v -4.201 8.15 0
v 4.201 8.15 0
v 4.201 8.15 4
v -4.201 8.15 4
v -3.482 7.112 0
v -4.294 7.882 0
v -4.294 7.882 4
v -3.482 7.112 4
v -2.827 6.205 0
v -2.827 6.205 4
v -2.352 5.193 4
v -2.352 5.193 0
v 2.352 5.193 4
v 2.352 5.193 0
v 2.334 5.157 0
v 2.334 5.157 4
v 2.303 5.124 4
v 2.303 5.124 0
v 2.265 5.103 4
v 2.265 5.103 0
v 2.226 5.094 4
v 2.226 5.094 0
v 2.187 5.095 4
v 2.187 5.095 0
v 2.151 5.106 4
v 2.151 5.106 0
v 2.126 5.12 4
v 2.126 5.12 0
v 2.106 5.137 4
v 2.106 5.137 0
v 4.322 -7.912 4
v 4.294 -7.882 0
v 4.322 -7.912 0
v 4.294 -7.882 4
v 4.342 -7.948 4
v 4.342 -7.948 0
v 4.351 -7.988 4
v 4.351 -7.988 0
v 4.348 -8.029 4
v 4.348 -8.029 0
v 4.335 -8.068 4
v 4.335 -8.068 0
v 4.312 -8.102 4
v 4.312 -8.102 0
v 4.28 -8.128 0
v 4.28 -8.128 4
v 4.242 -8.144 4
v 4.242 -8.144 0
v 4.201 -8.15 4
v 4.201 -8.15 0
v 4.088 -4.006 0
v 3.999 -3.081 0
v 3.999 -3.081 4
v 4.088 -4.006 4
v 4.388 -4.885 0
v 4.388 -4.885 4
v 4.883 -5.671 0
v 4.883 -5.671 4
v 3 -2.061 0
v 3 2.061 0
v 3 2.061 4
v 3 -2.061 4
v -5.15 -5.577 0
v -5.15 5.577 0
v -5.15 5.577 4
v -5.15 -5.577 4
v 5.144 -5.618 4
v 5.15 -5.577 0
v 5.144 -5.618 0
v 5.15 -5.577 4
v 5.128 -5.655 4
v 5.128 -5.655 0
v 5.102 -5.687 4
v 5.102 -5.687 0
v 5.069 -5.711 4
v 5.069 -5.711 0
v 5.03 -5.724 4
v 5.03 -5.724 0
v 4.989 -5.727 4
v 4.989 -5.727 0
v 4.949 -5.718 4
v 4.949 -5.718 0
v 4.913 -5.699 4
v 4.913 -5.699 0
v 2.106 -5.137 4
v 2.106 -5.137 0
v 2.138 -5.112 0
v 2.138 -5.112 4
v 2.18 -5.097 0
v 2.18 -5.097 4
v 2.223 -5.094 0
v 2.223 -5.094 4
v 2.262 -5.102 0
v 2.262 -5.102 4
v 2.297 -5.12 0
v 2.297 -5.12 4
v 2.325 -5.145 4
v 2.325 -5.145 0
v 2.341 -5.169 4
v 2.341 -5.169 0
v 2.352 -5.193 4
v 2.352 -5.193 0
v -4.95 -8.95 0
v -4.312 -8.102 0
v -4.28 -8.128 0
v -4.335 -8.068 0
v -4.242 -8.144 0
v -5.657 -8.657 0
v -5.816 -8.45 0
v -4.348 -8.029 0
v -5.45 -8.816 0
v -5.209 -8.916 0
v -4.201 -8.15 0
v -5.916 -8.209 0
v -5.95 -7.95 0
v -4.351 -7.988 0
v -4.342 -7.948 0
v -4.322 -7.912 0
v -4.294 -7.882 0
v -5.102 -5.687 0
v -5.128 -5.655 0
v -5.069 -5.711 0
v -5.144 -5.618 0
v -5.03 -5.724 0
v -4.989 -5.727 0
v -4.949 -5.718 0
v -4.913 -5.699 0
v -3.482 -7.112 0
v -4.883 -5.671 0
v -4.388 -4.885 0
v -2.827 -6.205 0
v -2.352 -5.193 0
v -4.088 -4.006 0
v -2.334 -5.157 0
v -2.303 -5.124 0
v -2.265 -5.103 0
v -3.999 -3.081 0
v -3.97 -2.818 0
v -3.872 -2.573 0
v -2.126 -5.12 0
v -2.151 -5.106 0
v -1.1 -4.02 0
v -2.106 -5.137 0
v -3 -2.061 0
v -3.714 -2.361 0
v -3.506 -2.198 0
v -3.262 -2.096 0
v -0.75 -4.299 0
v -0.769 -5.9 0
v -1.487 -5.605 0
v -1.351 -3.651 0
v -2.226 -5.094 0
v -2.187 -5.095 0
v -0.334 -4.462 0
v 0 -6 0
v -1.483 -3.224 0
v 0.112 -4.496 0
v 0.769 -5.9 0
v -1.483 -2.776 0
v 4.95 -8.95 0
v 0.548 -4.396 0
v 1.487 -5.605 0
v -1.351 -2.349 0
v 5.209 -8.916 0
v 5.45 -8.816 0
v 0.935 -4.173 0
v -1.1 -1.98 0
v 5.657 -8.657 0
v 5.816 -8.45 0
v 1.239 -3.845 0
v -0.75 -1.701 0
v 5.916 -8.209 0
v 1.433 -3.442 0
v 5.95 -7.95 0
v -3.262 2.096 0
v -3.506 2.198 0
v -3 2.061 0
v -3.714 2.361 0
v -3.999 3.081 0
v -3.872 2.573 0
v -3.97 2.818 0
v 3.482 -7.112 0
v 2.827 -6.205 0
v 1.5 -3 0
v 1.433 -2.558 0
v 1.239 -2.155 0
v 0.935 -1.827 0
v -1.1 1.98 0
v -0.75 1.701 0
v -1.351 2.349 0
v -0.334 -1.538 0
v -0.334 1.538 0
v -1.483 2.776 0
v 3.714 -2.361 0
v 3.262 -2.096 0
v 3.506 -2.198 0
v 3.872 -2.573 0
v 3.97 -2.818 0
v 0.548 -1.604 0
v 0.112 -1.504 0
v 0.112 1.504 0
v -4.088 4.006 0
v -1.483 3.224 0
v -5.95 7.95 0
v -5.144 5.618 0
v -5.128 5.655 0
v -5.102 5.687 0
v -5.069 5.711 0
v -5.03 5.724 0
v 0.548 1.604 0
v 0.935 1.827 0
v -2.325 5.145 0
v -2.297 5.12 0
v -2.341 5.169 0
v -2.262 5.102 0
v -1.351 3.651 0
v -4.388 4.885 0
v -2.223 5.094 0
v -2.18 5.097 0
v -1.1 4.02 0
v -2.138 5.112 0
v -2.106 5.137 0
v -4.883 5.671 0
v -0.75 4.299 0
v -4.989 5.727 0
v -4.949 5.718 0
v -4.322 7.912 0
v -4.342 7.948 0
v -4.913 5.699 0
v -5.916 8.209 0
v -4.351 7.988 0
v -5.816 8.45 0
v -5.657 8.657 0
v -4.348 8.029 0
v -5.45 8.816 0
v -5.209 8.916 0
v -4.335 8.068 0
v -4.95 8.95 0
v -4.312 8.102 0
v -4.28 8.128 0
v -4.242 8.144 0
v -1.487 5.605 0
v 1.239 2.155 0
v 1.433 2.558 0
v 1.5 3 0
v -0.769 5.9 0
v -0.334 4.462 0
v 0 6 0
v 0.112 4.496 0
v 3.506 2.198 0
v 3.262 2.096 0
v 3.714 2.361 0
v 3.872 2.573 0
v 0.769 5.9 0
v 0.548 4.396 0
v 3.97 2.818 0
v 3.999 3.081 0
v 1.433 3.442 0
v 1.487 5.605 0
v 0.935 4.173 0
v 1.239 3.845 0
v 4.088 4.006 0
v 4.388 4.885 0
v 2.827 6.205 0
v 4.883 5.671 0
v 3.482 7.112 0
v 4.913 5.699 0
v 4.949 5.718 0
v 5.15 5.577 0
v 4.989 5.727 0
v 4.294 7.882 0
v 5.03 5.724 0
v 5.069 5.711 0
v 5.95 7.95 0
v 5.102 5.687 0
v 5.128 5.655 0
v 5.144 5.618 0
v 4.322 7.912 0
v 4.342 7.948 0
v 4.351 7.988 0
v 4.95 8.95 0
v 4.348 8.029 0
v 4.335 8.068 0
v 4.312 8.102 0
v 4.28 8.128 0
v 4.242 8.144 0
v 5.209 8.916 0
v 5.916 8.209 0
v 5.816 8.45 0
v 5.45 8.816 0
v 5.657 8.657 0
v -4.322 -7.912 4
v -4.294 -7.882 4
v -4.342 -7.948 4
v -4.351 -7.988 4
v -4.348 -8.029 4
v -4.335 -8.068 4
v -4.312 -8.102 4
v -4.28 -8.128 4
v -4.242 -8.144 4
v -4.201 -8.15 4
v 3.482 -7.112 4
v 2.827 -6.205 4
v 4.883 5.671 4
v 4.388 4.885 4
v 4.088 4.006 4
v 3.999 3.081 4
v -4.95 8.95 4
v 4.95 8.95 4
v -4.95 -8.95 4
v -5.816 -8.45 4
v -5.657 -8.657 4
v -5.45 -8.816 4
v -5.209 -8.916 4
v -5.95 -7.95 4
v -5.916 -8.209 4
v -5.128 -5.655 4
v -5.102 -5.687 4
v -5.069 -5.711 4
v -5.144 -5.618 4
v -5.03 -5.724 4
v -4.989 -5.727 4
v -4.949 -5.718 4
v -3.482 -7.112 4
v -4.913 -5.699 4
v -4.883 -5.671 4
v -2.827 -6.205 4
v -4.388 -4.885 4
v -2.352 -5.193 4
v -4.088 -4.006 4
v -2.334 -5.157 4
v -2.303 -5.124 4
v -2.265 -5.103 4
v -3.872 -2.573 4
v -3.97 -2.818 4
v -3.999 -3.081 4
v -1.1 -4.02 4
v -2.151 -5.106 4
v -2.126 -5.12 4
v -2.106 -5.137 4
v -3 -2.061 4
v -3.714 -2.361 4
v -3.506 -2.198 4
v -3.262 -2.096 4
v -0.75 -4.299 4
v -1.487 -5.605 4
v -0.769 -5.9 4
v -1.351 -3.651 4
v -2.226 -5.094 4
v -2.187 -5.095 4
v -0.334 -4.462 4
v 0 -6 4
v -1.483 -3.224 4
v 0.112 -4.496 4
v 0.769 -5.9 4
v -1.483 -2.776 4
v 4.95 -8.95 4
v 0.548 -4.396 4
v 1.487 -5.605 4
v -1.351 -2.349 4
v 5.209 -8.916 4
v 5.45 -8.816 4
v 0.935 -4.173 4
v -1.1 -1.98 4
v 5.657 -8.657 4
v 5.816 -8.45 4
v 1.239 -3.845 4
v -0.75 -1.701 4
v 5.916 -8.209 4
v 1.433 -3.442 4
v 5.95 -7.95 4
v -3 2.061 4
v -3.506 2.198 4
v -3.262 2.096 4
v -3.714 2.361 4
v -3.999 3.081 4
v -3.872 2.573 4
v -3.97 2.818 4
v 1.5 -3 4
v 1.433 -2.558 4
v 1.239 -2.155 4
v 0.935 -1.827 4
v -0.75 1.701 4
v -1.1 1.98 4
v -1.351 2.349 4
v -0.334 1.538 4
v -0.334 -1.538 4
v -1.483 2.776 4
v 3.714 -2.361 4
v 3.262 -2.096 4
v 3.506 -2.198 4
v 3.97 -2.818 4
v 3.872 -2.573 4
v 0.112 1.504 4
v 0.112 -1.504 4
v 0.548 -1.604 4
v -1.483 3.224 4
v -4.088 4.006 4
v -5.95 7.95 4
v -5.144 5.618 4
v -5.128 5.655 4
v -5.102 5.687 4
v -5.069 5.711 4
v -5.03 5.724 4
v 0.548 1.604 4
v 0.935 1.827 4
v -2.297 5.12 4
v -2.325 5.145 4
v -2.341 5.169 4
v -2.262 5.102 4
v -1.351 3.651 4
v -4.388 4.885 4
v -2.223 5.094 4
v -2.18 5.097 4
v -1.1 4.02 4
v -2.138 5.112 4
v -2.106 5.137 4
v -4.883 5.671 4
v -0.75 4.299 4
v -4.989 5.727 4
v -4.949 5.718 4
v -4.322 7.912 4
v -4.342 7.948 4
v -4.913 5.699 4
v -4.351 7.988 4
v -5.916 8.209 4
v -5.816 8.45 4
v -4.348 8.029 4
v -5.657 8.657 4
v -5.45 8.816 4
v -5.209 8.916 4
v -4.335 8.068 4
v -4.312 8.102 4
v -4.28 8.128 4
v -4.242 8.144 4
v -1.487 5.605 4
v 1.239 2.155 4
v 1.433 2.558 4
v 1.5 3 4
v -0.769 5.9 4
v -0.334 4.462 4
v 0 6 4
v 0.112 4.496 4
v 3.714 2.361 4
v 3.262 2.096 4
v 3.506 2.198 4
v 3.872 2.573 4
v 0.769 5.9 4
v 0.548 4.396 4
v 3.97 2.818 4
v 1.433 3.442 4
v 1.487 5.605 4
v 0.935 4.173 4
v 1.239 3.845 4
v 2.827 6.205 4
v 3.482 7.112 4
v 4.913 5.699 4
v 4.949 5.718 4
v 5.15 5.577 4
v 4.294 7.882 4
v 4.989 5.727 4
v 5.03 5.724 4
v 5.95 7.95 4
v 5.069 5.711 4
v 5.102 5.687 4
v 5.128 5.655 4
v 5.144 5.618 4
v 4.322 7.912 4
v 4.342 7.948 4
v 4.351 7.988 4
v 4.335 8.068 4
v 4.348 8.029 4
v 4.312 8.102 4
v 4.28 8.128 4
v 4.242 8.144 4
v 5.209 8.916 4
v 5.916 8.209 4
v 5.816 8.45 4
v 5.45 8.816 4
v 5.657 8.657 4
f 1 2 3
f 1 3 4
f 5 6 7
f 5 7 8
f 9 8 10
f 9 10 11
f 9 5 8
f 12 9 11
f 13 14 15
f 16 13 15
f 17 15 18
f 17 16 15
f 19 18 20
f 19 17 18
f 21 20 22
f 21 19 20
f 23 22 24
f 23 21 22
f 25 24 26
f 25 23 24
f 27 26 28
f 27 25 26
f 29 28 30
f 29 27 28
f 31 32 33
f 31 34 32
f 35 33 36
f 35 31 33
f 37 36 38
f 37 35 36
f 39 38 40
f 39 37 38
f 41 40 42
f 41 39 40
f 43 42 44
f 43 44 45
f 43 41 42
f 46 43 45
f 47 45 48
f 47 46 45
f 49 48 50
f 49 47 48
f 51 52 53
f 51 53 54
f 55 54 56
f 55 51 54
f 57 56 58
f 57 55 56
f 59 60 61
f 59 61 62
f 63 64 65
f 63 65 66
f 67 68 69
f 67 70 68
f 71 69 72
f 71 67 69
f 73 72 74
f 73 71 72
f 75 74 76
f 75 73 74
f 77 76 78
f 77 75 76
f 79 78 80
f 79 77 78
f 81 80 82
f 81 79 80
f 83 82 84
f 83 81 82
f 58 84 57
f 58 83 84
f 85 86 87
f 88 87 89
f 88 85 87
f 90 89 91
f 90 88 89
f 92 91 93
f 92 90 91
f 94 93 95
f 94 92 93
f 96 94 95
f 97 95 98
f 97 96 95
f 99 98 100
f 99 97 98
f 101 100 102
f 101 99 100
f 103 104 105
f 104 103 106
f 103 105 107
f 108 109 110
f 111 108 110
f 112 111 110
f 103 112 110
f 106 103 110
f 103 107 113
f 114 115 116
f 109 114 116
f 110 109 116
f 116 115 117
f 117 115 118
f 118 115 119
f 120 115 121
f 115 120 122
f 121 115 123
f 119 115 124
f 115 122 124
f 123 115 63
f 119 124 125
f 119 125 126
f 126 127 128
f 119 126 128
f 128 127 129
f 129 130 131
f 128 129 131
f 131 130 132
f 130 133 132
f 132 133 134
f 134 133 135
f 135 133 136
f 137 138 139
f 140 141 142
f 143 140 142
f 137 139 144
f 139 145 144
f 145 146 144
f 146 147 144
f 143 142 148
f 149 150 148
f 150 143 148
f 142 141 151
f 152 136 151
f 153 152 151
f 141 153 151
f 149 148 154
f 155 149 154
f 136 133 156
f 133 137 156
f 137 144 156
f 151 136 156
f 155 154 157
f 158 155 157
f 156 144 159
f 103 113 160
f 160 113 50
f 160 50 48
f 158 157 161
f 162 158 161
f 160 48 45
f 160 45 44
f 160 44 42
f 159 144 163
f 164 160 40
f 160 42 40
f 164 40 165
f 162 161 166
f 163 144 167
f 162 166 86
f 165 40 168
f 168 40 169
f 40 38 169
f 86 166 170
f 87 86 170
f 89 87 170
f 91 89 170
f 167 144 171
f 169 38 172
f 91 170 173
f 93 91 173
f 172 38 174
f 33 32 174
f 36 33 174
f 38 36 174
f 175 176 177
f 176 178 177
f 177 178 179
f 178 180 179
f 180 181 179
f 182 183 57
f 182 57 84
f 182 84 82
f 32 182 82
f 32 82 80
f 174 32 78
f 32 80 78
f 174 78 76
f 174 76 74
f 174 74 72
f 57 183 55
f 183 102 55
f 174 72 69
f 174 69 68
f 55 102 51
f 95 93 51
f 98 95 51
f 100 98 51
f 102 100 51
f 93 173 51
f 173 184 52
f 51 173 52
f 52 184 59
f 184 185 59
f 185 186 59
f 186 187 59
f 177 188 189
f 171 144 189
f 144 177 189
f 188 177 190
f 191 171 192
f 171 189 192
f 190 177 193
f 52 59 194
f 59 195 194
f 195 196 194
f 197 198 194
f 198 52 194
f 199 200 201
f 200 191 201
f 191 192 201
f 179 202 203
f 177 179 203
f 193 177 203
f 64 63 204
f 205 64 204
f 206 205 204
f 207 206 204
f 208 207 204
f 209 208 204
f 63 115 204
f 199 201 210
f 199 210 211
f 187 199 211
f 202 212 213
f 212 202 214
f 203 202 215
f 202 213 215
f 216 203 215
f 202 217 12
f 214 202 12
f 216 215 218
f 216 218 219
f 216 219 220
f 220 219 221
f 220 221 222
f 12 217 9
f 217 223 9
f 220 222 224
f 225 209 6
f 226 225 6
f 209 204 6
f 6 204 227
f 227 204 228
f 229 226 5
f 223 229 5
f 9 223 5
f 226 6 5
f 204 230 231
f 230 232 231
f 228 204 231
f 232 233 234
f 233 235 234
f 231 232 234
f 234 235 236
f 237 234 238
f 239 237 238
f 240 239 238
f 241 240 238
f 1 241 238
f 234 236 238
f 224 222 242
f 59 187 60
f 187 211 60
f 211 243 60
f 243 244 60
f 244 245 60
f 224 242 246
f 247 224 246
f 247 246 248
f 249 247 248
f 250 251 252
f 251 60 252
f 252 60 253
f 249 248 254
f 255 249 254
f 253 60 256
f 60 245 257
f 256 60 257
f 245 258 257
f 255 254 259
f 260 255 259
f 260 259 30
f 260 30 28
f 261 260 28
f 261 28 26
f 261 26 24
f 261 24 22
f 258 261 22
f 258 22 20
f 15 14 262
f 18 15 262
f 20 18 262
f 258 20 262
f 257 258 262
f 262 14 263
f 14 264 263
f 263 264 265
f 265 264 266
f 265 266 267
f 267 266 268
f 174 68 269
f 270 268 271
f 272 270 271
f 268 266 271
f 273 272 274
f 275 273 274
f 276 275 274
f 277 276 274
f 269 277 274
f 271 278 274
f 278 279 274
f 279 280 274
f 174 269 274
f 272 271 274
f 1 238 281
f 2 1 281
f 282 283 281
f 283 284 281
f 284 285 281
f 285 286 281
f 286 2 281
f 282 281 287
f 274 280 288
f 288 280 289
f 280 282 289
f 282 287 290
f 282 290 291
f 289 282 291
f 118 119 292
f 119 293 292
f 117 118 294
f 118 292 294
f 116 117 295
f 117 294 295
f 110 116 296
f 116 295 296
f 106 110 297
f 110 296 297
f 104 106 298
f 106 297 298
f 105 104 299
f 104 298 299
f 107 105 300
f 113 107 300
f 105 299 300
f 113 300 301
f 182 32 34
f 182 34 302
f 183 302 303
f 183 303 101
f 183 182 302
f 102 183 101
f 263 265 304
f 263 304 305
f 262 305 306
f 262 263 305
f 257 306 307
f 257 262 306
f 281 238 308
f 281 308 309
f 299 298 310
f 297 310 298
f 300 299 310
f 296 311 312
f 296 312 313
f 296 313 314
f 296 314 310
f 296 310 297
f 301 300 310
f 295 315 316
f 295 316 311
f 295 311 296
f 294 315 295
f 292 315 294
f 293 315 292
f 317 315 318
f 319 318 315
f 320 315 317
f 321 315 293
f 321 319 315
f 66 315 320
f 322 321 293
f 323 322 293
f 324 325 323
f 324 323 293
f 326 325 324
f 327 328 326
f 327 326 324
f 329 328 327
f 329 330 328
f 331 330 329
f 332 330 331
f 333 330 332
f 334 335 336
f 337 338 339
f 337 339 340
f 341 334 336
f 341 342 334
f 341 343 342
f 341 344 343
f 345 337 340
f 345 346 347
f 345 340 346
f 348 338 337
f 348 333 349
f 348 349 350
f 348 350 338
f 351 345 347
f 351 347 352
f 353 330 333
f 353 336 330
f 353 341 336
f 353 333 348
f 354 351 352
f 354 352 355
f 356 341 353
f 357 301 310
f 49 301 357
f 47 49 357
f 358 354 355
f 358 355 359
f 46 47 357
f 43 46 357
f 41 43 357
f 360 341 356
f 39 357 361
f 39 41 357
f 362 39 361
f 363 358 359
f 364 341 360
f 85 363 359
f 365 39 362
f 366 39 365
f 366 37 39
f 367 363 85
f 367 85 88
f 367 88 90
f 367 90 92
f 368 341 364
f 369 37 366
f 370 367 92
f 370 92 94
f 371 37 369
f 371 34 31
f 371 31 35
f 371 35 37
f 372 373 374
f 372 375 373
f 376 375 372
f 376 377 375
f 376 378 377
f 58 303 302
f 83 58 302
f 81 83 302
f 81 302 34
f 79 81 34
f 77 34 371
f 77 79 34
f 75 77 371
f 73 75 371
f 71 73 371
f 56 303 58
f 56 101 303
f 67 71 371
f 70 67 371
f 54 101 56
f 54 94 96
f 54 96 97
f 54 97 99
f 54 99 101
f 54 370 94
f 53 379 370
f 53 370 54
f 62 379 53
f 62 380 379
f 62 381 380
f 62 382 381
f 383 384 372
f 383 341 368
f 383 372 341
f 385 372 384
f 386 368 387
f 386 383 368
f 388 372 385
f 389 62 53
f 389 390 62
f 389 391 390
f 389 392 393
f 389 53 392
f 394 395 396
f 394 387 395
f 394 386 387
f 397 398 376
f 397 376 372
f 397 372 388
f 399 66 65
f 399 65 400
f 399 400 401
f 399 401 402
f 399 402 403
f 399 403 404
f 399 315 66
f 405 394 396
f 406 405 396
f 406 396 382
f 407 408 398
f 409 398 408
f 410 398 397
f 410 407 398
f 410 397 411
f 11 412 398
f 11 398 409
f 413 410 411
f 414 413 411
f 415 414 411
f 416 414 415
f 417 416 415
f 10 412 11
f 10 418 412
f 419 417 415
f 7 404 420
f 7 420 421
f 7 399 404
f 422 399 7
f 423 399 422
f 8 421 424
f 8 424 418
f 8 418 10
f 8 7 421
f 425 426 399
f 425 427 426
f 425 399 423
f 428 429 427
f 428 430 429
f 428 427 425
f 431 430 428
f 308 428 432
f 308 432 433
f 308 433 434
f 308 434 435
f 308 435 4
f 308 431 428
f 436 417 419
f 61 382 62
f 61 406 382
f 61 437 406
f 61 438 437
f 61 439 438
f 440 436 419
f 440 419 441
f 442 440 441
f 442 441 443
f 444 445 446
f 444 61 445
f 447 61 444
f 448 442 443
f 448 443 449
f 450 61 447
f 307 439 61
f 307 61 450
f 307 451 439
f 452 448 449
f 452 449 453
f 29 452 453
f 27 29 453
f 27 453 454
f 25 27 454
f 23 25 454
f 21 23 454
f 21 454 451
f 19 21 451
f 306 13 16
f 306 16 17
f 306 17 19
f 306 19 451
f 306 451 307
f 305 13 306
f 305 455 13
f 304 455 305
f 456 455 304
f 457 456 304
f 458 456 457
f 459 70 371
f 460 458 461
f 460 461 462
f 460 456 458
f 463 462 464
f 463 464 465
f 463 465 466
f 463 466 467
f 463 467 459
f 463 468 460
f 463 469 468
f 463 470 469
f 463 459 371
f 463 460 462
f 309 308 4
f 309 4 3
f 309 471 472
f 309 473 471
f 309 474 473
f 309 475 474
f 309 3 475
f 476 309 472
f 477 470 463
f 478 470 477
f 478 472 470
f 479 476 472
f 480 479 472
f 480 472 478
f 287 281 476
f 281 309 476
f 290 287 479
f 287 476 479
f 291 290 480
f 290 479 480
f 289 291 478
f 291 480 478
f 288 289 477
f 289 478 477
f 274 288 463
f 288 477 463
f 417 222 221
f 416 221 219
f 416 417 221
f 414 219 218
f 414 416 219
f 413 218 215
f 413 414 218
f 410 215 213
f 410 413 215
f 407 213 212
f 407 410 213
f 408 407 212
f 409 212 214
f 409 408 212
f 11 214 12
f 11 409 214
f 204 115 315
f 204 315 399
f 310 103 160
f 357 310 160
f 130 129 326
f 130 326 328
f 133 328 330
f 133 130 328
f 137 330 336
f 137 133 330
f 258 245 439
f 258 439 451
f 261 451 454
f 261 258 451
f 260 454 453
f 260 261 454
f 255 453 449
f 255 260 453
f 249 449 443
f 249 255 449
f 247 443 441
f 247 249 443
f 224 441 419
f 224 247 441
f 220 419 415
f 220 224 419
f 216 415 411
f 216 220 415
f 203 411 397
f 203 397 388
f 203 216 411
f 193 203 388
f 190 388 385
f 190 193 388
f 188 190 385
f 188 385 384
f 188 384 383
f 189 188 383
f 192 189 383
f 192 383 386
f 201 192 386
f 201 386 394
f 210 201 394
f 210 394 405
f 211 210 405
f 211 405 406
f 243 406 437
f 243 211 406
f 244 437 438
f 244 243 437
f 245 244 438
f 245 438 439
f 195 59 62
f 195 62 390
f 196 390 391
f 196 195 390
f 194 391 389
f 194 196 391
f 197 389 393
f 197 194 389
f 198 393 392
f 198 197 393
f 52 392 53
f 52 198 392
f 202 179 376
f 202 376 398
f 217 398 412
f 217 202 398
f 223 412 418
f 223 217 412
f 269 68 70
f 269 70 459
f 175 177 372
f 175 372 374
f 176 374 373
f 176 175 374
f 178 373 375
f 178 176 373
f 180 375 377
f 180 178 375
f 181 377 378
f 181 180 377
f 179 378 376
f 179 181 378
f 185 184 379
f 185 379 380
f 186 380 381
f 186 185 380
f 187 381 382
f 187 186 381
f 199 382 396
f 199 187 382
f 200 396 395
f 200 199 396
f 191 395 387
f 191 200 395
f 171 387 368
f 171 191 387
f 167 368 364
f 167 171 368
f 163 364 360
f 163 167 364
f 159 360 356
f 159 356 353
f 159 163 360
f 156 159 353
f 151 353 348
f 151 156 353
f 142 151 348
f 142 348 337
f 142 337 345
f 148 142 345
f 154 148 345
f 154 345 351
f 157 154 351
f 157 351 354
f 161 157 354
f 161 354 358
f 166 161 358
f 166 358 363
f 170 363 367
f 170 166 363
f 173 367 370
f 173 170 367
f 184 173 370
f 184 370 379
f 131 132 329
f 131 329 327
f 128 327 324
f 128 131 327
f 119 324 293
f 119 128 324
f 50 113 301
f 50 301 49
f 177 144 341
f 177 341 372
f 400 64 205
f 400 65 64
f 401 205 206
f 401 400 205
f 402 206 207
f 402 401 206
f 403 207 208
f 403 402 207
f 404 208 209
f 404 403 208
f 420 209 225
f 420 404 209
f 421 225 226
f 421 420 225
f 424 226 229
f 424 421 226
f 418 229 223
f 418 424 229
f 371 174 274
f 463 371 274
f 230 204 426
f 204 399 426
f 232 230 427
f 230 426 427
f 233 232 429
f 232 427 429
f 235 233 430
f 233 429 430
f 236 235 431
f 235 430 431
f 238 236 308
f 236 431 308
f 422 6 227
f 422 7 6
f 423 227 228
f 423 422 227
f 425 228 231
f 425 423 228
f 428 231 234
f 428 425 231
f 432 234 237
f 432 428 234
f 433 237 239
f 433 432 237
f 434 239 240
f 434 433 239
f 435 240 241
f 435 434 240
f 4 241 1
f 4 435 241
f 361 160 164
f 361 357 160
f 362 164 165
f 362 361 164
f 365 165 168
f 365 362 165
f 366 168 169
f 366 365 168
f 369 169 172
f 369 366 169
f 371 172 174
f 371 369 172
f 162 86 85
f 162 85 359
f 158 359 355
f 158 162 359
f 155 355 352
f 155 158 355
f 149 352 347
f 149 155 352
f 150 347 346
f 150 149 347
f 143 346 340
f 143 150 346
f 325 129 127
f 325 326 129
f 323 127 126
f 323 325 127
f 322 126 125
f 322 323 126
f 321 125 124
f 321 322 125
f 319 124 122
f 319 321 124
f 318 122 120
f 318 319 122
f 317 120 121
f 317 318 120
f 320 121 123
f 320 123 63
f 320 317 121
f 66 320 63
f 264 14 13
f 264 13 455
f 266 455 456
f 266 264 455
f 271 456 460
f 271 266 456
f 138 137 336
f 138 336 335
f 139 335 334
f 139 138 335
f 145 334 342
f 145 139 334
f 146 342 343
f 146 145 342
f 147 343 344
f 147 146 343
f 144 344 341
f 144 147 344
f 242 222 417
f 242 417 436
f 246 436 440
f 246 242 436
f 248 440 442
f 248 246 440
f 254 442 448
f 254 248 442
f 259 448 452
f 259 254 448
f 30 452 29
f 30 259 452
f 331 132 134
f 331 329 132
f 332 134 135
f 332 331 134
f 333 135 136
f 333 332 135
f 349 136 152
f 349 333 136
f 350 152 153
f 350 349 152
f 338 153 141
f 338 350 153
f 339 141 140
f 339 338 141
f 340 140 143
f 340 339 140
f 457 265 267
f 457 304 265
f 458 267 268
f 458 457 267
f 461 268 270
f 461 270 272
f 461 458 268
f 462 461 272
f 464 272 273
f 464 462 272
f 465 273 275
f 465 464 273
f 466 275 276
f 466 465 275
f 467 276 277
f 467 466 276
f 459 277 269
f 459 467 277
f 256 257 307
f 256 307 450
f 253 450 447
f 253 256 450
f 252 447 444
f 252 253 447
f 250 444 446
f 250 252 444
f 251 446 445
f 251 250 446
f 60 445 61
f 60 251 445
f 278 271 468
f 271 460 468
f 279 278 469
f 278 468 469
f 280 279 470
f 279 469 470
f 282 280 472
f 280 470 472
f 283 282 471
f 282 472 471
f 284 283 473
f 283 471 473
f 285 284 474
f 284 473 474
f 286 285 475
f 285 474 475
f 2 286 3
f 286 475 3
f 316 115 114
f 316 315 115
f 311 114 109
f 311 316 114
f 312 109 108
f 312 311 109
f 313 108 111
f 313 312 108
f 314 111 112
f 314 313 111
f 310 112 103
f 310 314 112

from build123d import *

# Parameters (mm, degrees)
SKETCH1_R           = 1.5
BOSS_EXTRUDE1_DEPTH = 4
SKETCH3_W           = 11.9
SKETCH3_H           = 17.9
BOSS_EXTRUDE2_DEPTH = 4
FILLET1_R           = 1
FILLET2_R           = 0.15


with BuildPart() as part:
    # Sketch1 → Boss-Extrude1 (new body)
    with BuildSketch(Plane.XY):
        with BuildLine():
            Line((3, 3), (3, -3))
            ThreePointArc((3, -3), (0, -6), (-3, -3))
            Line((-3, -3), (-3, 3))
            ThreePointArc((-3, 3), (0, 6), (3, 3))
        make_face()
        with Locations((0, 3)):
            Circle(SKETCH1_R, mode=Mode.SUBTRACT)
        with Locations((0, -3)):
            Circle(SKETCH1_R, mode=Mode.SUBTRACT)
    extrude(amount=BOSS_EXTRUDE1_DEPTH)

    # Sketch3 → Boss-Extrude2 (add)
    with BuildSketch(Plane.XY):
        Rectangle(SKETCH3_W, SKETCH3_H)
        with BuildLine():
            Line((3, 2.060806436), (3, 3))
            ThreePointArc((3, 3), (2.812460431, 4.044062414), (2.273289117, 4.957589484))
            ThreePointArc((2.273289117, 4.957589484), (3.195390382, 6.758191712), (4.663487388, 8.15))
            Line((4.663487388, 8.15), (-4.663487388, 8.15))
            ThreePointArc((-4.663487388, 8.15), (-3.195390382, 6.758191712), (-2.273289117, 4.957589484))
            ThreePointArc((-2.273289117, 4.957589484), (-2.812460431, 4.044062414), (-3, 3))
            Line((-3, 3), (-3, 2.060806436))
            ThreePointArc((-3, 2.060806436), (-3.713836261, 2.361122359), (-3.999178271, 3.081074995))
            ThreePointArc((-3.999178271, 3.081074995), (-4.282258248, 4.642222106), (-5.15, 5.970506272))
            Line((-5.15, 5.970506272), (-5.15, -5.970506272))
            ThreePointArc((-5.15, -5.970506272), (-4.282258248, -4.642222106), (-3.999178271, -3.081074995))
            ThreePointArc((-3.999178271, -3.081074995), (-3.713836261, -2.361122359), (-3, -2.060806436))
            Line((-3, -2.060806436), (-3, -3))
            ThreePointArc((-3, -3), (-2.812460431, -4.044062414), (-2.273289117, -4.957589484))
            ThreePointArc((-2.273289117, -4.957589484), (-3.195390382, -6.758191712), (-4.663487388, -8.15))
            Line((-4.663487388, -8.15), (4.663487388, -8.15))
            ThreePointArc((4.663487388, -8.15), (3.195390382, -6.758191712), (2.273289117, -4.957589484))
            ThreePointArc((2.273289117, -4.957589484), (2.812460431, -4.044062414), (3, -3))
            Line((3, -3), (3, -2.060806436))
            ThreePointArc((3, -2.060806436), (3.713836261, -2.361122359), (3.999178271, -3.081074995))
            ThreePointArc((3.999178271, -3.081074995), (4.282258248, -4.642222106), (5.15, -5.970506272))
            Line((5.15, -5.970506272), (5.15, 5.970506272))
            ThreePointArc((5.15, 5.970506272), (4.282258248, 4.642222106), (3.999178271, 3.081074995))
            ThreePointArc((3.999178271, 3.081074995), (3.713836261, 2.361122359), (3, 2.060806436))
        make_face(mode=Mode.SUBTRACT)
    extrude(amount=BOSS_EXTRUDE2_DEPTH)

    # Fillet1
    fillet1_edges = [part.edges().sort_by_distance(p)[0] for p in [
        (5.95, 8.95, 2),
        (-5.95, 8.95, 2),
        (-5.95, -8.95, 2),
        (5.95, -8.95, 2),
    ]]
    fillet(fillet1_edges, radius=FILLET1_R)

    # Fillet2
    fillet2_edges = [part.edges().sort_by_distance(p)[0] for p in [
        (-5.15, 5.970506272, 2),
        (-5.15, -5.970506272, 2),
        (-2.273289117, -4.957589484, 2),
        (-4.663487388, -8.15, 2),
        (4.663487388, -8.15, 2),
        (2.273289117, -4.957589484, 2),
        (5.15, -5.970506272, 2),
        (5.15, 5.970506272, 2),
        (2.273289117, 4.957589484, 2),
        (4.663487388, 8.15, 2),
        (-4.663487388, 8.15, 2),
        (-2.273289117, 4.957589484, 2),
    ]]
    fillet(fillet2_edges, radius=FILLET2_R)


solid = part.part
